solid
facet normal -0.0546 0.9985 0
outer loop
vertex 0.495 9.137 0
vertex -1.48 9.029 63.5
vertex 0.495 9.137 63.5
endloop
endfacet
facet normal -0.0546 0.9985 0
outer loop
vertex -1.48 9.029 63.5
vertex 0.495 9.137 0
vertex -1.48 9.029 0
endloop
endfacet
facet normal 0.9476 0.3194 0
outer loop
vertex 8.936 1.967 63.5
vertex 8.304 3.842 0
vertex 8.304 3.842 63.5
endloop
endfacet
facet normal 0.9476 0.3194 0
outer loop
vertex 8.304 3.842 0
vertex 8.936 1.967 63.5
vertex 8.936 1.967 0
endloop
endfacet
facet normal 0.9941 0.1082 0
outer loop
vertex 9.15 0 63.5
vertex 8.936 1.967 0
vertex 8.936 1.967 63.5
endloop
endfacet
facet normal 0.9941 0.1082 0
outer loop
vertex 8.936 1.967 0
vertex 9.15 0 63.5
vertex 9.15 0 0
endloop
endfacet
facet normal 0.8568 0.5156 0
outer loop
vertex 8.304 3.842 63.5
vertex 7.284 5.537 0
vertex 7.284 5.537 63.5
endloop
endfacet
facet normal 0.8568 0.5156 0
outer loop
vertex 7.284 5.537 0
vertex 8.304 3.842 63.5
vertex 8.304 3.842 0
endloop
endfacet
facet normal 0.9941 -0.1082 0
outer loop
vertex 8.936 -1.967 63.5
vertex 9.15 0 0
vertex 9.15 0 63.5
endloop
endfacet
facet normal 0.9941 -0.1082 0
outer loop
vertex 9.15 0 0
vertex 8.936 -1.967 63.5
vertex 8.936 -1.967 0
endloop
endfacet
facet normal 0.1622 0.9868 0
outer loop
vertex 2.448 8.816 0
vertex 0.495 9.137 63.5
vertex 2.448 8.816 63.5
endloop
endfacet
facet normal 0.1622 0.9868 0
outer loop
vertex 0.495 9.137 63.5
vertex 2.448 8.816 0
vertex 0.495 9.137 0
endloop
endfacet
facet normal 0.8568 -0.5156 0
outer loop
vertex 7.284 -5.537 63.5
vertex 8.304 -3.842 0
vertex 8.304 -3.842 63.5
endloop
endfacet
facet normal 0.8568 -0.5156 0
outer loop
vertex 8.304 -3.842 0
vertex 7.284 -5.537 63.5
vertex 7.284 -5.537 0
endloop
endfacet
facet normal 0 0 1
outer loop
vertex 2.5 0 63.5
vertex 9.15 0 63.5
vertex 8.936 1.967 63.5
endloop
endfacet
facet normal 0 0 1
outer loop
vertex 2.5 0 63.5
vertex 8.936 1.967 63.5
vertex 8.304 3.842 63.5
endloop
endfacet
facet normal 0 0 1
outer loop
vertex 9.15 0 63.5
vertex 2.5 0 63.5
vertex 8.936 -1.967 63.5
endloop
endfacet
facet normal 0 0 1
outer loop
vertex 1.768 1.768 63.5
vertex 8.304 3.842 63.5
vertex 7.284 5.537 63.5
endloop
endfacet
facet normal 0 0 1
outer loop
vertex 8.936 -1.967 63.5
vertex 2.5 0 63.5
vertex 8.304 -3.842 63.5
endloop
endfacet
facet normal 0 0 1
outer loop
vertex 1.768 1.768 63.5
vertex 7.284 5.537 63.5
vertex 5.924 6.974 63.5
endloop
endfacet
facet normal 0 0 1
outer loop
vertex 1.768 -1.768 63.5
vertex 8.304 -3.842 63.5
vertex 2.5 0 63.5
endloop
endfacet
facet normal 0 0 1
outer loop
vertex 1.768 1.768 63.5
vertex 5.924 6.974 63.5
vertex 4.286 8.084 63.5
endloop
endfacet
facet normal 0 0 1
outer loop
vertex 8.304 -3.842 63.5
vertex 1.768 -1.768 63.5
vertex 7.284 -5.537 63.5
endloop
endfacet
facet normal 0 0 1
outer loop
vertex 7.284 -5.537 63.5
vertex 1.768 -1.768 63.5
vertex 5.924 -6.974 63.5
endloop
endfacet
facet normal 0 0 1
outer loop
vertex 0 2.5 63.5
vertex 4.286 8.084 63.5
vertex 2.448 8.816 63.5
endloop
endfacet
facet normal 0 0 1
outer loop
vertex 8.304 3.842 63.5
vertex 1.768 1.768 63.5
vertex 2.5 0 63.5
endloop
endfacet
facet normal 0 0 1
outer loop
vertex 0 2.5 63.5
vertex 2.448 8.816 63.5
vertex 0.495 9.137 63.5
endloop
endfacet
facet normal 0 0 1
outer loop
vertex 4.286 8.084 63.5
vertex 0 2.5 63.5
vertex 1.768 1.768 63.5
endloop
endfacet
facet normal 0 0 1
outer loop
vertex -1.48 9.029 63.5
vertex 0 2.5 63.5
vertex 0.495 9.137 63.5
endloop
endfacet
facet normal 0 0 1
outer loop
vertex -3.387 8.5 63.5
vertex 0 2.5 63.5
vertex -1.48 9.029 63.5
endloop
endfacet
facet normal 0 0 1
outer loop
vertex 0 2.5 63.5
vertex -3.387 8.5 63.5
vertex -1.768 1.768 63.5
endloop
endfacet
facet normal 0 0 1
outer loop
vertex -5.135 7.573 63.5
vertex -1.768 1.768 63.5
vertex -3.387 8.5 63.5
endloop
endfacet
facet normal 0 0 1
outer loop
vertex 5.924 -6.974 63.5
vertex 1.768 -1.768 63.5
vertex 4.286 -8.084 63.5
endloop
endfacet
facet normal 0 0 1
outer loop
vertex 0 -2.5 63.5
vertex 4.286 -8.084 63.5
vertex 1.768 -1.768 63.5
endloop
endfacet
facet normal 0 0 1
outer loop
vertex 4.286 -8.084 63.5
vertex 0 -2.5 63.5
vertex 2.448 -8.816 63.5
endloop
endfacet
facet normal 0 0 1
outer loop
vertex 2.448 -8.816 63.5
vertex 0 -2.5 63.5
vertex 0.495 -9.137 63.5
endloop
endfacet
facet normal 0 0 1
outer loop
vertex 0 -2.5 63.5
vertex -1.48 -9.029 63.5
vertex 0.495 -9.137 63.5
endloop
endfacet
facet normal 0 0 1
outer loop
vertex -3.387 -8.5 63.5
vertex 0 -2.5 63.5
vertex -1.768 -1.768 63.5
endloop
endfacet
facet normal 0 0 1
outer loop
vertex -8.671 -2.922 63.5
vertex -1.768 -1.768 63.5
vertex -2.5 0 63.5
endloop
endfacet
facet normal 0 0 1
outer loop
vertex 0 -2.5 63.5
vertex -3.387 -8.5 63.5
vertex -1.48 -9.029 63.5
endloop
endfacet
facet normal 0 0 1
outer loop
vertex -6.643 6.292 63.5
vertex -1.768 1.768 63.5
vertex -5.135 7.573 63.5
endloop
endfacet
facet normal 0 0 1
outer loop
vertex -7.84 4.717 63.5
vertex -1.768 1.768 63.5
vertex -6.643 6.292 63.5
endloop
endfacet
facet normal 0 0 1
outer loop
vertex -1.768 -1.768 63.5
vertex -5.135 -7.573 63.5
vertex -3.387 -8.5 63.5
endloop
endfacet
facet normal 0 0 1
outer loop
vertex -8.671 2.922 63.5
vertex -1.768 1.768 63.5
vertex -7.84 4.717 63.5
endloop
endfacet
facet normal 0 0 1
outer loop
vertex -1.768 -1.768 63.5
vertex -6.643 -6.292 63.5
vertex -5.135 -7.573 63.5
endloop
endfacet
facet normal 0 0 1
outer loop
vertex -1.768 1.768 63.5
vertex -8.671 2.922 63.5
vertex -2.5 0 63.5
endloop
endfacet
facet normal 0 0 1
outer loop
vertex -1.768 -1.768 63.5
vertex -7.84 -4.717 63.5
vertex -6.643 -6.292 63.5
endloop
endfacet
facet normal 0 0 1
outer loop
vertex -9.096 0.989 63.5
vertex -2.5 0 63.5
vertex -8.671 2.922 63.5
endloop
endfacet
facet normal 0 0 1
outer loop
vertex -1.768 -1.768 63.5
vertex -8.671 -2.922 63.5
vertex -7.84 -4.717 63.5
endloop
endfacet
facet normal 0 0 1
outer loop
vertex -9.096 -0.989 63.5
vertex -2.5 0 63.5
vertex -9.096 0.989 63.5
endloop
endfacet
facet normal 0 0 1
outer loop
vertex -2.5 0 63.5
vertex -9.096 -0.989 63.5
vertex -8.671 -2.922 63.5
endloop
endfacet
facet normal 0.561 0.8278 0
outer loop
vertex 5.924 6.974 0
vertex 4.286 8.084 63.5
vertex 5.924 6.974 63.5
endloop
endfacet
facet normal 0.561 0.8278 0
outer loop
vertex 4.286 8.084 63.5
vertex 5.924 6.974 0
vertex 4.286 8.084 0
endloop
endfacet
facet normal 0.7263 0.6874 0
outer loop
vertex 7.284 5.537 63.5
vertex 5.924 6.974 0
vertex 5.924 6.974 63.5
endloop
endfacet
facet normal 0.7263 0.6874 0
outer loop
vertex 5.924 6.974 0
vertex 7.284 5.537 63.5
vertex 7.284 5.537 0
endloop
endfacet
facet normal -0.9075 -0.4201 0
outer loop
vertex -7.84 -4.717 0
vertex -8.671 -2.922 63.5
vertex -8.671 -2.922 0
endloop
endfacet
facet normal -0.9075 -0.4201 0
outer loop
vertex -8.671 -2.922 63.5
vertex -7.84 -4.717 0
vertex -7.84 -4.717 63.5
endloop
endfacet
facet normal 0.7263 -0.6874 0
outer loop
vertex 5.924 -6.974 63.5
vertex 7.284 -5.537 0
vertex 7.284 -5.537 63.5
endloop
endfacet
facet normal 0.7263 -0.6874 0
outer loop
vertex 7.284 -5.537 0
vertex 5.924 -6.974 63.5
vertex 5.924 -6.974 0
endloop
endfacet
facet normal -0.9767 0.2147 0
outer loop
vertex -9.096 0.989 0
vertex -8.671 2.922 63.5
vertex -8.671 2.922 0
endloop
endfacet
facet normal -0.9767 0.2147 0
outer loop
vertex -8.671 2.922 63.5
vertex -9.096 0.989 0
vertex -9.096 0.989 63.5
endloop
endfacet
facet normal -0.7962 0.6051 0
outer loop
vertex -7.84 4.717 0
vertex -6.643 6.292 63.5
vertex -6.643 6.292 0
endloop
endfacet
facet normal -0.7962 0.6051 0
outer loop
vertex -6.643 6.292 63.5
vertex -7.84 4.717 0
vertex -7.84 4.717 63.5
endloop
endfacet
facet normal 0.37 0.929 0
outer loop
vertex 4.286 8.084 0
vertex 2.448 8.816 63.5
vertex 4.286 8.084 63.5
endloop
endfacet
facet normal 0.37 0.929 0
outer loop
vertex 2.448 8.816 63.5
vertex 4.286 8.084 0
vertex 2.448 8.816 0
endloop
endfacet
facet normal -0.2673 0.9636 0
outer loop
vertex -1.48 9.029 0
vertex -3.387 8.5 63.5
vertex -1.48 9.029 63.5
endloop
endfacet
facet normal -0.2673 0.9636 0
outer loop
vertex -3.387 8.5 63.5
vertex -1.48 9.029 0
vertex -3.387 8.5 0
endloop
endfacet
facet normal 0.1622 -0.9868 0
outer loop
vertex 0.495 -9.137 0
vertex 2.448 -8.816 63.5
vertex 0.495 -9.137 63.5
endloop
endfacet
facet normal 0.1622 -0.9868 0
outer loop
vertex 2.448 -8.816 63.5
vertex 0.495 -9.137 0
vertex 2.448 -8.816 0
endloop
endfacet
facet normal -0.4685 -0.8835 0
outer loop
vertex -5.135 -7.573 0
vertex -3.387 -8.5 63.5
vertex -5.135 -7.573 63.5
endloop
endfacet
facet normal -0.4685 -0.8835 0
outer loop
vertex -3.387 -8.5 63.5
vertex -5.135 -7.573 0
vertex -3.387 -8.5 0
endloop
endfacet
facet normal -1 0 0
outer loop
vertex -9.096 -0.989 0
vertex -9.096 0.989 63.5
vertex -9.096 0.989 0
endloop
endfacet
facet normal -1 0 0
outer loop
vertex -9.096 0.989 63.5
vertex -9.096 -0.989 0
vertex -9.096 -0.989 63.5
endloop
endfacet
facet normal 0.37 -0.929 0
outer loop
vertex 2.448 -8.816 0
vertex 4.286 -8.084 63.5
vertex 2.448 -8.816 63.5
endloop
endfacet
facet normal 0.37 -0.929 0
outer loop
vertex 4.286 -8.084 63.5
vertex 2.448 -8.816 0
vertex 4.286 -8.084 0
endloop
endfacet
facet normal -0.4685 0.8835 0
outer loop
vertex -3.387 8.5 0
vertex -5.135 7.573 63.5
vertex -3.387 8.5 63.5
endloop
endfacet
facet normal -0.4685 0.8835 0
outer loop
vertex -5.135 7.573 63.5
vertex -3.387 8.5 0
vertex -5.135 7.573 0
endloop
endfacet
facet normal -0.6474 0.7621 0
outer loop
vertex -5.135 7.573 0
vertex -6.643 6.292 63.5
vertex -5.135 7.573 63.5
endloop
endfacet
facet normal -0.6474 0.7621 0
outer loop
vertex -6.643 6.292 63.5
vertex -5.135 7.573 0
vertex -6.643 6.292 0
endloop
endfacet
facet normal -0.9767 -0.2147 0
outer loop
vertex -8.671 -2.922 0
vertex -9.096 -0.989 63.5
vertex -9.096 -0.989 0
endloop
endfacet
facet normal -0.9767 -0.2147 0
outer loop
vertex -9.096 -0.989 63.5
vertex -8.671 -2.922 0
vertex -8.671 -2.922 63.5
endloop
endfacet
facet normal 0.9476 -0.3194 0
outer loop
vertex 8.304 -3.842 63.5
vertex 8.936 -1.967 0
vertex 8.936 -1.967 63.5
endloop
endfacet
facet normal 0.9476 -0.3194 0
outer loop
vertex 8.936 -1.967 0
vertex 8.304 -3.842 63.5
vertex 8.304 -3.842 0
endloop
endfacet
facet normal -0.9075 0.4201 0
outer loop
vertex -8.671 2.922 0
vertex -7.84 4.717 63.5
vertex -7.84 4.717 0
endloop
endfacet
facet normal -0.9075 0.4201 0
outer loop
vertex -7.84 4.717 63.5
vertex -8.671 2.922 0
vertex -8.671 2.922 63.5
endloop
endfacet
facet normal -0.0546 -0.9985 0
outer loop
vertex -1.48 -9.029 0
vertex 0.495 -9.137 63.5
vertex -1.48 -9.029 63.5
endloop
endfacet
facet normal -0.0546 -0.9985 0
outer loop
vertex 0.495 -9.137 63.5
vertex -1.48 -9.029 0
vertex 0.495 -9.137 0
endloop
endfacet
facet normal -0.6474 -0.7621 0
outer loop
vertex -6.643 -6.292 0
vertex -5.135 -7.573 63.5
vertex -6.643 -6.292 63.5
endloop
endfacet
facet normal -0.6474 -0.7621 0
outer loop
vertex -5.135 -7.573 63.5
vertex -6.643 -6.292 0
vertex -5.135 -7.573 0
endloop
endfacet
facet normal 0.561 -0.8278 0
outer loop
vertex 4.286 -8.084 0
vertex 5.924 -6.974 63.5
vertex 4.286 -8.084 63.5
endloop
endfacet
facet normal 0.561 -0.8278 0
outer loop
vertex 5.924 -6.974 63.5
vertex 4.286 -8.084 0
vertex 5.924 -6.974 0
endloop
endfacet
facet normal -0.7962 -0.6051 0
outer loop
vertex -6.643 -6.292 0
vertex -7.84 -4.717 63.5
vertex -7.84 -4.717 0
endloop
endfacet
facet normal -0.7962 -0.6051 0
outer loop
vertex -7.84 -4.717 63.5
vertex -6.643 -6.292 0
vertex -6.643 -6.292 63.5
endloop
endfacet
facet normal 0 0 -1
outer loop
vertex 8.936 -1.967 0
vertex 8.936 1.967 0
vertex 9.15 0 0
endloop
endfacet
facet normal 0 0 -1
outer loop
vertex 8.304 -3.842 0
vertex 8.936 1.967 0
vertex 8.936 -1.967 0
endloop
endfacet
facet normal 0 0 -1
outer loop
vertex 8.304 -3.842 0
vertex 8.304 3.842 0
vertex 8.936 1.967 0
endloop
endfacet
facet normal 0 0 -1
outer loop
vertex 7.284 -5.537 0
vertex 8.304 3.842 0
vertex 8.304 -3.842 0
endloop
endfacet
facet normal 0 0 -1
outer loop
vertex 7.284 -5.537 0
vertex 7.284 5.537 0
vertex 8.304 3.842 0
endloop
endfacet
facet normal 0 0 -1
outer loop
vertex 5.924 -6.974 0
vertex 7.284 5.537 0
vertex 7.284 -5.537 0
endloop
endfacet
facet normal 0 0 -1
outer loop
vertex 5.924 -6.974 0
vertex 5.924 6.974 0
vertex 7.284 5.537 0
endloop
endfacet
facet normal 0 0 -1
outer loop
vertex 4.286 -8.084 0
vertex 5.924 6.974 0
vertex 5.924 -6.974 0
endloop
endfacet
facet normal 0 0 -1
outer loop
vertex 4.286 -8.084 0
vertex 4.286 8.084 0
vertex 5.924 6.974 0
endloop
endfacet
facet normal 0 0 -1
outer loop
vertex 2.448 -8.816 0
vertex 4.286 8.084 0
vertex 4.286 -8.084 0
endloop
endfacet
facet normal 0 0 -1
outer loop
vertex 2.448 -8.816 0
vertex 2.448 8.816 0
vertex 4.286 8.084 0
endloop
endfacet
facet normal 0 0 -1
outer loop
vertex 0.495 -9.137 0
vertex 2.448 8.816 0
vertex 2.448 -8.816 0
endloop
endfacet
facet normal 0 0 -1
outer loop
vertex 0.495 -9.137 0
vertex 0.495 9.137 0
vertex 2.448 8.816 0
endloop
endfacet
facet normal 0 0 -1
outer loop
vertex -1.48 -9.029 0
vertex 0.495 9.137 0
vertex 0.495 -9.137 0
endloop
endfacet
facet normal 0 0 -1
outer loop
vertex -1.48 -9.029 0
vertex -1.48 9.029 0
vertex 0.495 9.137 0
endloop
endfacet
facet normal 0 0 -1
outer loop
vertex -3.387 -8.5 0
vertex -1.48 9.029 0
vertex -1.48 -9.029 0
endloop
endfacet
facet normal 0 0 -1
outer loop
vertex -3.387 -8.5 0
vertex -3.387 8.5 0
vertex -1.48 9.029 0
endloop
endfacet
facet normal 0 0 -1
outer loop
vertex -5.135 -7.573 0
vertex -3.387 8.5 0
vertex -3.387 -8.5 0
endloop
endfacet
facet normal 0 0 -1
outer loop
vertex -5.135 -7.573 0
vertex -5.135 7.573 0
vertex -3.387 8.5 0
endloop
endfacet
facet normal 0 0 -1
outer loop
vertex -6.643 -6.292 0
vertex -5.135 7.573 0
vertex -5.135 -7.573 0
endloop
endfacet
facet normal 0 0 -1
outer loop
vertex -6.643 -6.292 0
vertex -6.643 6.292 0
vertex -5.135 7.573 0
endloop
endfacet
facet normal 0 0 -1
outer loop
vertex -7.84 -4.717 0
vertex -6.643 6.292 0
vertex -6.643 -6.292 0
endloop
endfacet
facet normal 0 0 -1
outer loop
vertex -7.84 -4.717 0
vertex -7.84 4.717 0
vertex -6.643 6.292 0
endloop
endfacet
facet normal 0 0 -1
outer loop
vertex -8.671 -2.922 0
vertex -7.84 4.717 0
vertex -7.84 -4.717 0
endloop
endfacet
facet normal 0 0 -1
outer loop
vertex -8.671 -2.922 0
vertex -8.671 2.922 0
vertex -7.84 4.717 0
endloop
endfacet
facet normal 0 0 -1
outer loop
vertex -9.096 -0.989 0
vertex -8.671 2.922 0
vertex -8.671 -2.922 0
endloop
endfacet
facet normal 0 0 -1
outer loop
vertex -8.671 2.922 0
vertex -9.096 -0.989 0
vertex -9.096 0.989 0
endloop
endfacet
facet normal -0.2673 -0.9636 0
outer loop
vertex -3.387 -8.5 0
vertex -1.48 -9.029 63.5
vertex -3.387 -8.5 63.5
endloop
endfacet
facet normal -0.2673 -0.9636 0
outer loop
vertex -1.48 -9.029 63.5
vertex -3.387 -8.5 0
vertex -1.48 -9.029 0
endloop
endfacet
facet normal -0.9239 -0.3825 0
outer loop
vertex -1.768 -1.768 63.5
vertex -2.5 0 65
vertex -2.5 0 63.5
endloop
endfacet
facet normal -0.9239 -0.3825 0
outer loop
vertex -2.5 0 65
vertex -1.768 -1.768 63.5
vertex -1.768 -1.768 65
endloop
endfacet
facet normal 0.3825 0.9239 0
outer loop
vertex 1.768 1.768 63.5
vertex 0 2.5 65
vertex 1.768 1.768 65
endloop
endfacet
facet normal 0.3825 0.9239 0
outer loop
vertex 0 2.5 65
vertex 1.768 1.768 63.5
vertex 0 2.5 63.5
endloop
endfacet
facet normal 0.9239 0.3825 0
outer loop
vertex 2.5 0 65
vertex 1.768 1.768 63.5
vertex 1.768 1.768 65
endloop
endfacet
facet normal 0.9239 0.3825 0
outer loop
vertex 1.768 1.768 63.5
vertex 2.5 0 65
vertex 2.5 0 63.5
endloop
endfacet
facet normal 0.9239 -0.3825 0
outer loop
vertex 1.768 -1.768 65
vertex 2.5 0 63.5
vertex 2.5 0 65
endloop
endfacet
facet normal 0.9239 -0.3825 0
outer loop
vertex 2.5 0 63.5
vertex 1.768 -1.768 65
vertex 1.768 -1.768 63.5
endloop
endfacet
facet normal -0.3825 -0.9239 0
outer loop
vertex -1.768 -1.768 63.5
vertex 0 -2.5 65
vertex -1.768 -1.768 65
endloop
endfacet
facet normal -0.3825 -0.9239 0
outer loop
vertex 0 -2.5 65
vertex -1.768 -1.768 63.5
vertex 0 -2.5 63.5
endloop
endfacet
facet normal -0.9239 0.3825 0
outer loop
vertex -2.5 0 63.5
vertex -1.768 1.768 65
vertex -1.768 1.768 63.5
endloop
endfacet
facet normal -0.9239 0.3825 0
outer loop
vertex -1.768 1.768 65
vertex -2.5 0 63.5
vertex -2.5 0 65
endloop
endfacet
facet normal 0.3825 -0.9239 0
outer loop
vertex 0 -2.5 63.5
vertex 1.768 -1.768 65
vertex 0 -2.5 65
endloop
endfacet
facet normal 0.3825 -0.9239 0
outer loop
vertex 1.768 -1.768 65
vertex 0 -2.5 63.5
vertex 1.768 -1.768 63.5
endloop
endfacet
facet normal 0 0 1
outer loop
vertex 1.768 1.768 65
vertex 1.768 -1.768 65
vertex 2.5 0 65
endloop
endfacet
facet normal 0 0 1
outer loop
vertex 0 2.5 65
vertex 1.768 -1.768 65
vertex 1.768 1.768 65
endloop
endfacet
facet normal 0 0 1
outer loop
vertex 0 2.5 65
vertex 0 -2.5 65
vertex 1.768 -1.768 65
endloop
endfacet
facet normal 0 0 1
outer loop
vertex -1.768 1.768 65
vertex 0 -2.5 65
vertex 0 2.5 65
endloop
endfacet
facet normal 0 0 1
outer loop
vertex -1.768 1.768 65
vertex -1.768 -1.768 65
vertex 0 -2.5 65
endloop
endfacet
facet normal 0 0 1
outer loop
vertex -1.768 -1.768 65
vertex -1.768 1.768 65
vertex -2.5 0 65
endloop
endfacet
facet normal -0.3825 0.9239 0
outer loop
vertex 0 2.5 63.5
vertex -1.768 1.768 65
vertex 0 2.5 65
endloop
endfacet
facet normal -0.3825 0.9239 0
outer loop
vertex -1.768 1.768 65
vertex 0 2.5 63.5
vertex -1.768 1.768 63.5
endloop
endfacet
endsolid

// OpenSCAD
// Parameters for the battery cell
battery_height = 65.0;
battery_diameter = 18.3;
terminal_button_height = 1.5;
terminal_button_diameter = 5.0;

// Main battery cell body
module cylindrical_cell_body() {
    cylinder(h = battery_height - terminal_button_height, d = battery_diameter, center = false);
}

// Positive terminal button
module positive_terminal_button() {
    translate([0, 0, battery_height - terminal_button_height])
        cylinder(h = terminal_button_height, d = terminal_button_diameter, center = false);
}

// Negative terminal endcap (flat)
module negative_terminal_endcap() {
    // The negative end is flat, so no additional geometry is needed
}

// Complete battery model
module battery() {
    cylindrical_cell_body();
    positive_terminal_button();
    negative_terminal_endcap();
}

// Render the battery
battery();
